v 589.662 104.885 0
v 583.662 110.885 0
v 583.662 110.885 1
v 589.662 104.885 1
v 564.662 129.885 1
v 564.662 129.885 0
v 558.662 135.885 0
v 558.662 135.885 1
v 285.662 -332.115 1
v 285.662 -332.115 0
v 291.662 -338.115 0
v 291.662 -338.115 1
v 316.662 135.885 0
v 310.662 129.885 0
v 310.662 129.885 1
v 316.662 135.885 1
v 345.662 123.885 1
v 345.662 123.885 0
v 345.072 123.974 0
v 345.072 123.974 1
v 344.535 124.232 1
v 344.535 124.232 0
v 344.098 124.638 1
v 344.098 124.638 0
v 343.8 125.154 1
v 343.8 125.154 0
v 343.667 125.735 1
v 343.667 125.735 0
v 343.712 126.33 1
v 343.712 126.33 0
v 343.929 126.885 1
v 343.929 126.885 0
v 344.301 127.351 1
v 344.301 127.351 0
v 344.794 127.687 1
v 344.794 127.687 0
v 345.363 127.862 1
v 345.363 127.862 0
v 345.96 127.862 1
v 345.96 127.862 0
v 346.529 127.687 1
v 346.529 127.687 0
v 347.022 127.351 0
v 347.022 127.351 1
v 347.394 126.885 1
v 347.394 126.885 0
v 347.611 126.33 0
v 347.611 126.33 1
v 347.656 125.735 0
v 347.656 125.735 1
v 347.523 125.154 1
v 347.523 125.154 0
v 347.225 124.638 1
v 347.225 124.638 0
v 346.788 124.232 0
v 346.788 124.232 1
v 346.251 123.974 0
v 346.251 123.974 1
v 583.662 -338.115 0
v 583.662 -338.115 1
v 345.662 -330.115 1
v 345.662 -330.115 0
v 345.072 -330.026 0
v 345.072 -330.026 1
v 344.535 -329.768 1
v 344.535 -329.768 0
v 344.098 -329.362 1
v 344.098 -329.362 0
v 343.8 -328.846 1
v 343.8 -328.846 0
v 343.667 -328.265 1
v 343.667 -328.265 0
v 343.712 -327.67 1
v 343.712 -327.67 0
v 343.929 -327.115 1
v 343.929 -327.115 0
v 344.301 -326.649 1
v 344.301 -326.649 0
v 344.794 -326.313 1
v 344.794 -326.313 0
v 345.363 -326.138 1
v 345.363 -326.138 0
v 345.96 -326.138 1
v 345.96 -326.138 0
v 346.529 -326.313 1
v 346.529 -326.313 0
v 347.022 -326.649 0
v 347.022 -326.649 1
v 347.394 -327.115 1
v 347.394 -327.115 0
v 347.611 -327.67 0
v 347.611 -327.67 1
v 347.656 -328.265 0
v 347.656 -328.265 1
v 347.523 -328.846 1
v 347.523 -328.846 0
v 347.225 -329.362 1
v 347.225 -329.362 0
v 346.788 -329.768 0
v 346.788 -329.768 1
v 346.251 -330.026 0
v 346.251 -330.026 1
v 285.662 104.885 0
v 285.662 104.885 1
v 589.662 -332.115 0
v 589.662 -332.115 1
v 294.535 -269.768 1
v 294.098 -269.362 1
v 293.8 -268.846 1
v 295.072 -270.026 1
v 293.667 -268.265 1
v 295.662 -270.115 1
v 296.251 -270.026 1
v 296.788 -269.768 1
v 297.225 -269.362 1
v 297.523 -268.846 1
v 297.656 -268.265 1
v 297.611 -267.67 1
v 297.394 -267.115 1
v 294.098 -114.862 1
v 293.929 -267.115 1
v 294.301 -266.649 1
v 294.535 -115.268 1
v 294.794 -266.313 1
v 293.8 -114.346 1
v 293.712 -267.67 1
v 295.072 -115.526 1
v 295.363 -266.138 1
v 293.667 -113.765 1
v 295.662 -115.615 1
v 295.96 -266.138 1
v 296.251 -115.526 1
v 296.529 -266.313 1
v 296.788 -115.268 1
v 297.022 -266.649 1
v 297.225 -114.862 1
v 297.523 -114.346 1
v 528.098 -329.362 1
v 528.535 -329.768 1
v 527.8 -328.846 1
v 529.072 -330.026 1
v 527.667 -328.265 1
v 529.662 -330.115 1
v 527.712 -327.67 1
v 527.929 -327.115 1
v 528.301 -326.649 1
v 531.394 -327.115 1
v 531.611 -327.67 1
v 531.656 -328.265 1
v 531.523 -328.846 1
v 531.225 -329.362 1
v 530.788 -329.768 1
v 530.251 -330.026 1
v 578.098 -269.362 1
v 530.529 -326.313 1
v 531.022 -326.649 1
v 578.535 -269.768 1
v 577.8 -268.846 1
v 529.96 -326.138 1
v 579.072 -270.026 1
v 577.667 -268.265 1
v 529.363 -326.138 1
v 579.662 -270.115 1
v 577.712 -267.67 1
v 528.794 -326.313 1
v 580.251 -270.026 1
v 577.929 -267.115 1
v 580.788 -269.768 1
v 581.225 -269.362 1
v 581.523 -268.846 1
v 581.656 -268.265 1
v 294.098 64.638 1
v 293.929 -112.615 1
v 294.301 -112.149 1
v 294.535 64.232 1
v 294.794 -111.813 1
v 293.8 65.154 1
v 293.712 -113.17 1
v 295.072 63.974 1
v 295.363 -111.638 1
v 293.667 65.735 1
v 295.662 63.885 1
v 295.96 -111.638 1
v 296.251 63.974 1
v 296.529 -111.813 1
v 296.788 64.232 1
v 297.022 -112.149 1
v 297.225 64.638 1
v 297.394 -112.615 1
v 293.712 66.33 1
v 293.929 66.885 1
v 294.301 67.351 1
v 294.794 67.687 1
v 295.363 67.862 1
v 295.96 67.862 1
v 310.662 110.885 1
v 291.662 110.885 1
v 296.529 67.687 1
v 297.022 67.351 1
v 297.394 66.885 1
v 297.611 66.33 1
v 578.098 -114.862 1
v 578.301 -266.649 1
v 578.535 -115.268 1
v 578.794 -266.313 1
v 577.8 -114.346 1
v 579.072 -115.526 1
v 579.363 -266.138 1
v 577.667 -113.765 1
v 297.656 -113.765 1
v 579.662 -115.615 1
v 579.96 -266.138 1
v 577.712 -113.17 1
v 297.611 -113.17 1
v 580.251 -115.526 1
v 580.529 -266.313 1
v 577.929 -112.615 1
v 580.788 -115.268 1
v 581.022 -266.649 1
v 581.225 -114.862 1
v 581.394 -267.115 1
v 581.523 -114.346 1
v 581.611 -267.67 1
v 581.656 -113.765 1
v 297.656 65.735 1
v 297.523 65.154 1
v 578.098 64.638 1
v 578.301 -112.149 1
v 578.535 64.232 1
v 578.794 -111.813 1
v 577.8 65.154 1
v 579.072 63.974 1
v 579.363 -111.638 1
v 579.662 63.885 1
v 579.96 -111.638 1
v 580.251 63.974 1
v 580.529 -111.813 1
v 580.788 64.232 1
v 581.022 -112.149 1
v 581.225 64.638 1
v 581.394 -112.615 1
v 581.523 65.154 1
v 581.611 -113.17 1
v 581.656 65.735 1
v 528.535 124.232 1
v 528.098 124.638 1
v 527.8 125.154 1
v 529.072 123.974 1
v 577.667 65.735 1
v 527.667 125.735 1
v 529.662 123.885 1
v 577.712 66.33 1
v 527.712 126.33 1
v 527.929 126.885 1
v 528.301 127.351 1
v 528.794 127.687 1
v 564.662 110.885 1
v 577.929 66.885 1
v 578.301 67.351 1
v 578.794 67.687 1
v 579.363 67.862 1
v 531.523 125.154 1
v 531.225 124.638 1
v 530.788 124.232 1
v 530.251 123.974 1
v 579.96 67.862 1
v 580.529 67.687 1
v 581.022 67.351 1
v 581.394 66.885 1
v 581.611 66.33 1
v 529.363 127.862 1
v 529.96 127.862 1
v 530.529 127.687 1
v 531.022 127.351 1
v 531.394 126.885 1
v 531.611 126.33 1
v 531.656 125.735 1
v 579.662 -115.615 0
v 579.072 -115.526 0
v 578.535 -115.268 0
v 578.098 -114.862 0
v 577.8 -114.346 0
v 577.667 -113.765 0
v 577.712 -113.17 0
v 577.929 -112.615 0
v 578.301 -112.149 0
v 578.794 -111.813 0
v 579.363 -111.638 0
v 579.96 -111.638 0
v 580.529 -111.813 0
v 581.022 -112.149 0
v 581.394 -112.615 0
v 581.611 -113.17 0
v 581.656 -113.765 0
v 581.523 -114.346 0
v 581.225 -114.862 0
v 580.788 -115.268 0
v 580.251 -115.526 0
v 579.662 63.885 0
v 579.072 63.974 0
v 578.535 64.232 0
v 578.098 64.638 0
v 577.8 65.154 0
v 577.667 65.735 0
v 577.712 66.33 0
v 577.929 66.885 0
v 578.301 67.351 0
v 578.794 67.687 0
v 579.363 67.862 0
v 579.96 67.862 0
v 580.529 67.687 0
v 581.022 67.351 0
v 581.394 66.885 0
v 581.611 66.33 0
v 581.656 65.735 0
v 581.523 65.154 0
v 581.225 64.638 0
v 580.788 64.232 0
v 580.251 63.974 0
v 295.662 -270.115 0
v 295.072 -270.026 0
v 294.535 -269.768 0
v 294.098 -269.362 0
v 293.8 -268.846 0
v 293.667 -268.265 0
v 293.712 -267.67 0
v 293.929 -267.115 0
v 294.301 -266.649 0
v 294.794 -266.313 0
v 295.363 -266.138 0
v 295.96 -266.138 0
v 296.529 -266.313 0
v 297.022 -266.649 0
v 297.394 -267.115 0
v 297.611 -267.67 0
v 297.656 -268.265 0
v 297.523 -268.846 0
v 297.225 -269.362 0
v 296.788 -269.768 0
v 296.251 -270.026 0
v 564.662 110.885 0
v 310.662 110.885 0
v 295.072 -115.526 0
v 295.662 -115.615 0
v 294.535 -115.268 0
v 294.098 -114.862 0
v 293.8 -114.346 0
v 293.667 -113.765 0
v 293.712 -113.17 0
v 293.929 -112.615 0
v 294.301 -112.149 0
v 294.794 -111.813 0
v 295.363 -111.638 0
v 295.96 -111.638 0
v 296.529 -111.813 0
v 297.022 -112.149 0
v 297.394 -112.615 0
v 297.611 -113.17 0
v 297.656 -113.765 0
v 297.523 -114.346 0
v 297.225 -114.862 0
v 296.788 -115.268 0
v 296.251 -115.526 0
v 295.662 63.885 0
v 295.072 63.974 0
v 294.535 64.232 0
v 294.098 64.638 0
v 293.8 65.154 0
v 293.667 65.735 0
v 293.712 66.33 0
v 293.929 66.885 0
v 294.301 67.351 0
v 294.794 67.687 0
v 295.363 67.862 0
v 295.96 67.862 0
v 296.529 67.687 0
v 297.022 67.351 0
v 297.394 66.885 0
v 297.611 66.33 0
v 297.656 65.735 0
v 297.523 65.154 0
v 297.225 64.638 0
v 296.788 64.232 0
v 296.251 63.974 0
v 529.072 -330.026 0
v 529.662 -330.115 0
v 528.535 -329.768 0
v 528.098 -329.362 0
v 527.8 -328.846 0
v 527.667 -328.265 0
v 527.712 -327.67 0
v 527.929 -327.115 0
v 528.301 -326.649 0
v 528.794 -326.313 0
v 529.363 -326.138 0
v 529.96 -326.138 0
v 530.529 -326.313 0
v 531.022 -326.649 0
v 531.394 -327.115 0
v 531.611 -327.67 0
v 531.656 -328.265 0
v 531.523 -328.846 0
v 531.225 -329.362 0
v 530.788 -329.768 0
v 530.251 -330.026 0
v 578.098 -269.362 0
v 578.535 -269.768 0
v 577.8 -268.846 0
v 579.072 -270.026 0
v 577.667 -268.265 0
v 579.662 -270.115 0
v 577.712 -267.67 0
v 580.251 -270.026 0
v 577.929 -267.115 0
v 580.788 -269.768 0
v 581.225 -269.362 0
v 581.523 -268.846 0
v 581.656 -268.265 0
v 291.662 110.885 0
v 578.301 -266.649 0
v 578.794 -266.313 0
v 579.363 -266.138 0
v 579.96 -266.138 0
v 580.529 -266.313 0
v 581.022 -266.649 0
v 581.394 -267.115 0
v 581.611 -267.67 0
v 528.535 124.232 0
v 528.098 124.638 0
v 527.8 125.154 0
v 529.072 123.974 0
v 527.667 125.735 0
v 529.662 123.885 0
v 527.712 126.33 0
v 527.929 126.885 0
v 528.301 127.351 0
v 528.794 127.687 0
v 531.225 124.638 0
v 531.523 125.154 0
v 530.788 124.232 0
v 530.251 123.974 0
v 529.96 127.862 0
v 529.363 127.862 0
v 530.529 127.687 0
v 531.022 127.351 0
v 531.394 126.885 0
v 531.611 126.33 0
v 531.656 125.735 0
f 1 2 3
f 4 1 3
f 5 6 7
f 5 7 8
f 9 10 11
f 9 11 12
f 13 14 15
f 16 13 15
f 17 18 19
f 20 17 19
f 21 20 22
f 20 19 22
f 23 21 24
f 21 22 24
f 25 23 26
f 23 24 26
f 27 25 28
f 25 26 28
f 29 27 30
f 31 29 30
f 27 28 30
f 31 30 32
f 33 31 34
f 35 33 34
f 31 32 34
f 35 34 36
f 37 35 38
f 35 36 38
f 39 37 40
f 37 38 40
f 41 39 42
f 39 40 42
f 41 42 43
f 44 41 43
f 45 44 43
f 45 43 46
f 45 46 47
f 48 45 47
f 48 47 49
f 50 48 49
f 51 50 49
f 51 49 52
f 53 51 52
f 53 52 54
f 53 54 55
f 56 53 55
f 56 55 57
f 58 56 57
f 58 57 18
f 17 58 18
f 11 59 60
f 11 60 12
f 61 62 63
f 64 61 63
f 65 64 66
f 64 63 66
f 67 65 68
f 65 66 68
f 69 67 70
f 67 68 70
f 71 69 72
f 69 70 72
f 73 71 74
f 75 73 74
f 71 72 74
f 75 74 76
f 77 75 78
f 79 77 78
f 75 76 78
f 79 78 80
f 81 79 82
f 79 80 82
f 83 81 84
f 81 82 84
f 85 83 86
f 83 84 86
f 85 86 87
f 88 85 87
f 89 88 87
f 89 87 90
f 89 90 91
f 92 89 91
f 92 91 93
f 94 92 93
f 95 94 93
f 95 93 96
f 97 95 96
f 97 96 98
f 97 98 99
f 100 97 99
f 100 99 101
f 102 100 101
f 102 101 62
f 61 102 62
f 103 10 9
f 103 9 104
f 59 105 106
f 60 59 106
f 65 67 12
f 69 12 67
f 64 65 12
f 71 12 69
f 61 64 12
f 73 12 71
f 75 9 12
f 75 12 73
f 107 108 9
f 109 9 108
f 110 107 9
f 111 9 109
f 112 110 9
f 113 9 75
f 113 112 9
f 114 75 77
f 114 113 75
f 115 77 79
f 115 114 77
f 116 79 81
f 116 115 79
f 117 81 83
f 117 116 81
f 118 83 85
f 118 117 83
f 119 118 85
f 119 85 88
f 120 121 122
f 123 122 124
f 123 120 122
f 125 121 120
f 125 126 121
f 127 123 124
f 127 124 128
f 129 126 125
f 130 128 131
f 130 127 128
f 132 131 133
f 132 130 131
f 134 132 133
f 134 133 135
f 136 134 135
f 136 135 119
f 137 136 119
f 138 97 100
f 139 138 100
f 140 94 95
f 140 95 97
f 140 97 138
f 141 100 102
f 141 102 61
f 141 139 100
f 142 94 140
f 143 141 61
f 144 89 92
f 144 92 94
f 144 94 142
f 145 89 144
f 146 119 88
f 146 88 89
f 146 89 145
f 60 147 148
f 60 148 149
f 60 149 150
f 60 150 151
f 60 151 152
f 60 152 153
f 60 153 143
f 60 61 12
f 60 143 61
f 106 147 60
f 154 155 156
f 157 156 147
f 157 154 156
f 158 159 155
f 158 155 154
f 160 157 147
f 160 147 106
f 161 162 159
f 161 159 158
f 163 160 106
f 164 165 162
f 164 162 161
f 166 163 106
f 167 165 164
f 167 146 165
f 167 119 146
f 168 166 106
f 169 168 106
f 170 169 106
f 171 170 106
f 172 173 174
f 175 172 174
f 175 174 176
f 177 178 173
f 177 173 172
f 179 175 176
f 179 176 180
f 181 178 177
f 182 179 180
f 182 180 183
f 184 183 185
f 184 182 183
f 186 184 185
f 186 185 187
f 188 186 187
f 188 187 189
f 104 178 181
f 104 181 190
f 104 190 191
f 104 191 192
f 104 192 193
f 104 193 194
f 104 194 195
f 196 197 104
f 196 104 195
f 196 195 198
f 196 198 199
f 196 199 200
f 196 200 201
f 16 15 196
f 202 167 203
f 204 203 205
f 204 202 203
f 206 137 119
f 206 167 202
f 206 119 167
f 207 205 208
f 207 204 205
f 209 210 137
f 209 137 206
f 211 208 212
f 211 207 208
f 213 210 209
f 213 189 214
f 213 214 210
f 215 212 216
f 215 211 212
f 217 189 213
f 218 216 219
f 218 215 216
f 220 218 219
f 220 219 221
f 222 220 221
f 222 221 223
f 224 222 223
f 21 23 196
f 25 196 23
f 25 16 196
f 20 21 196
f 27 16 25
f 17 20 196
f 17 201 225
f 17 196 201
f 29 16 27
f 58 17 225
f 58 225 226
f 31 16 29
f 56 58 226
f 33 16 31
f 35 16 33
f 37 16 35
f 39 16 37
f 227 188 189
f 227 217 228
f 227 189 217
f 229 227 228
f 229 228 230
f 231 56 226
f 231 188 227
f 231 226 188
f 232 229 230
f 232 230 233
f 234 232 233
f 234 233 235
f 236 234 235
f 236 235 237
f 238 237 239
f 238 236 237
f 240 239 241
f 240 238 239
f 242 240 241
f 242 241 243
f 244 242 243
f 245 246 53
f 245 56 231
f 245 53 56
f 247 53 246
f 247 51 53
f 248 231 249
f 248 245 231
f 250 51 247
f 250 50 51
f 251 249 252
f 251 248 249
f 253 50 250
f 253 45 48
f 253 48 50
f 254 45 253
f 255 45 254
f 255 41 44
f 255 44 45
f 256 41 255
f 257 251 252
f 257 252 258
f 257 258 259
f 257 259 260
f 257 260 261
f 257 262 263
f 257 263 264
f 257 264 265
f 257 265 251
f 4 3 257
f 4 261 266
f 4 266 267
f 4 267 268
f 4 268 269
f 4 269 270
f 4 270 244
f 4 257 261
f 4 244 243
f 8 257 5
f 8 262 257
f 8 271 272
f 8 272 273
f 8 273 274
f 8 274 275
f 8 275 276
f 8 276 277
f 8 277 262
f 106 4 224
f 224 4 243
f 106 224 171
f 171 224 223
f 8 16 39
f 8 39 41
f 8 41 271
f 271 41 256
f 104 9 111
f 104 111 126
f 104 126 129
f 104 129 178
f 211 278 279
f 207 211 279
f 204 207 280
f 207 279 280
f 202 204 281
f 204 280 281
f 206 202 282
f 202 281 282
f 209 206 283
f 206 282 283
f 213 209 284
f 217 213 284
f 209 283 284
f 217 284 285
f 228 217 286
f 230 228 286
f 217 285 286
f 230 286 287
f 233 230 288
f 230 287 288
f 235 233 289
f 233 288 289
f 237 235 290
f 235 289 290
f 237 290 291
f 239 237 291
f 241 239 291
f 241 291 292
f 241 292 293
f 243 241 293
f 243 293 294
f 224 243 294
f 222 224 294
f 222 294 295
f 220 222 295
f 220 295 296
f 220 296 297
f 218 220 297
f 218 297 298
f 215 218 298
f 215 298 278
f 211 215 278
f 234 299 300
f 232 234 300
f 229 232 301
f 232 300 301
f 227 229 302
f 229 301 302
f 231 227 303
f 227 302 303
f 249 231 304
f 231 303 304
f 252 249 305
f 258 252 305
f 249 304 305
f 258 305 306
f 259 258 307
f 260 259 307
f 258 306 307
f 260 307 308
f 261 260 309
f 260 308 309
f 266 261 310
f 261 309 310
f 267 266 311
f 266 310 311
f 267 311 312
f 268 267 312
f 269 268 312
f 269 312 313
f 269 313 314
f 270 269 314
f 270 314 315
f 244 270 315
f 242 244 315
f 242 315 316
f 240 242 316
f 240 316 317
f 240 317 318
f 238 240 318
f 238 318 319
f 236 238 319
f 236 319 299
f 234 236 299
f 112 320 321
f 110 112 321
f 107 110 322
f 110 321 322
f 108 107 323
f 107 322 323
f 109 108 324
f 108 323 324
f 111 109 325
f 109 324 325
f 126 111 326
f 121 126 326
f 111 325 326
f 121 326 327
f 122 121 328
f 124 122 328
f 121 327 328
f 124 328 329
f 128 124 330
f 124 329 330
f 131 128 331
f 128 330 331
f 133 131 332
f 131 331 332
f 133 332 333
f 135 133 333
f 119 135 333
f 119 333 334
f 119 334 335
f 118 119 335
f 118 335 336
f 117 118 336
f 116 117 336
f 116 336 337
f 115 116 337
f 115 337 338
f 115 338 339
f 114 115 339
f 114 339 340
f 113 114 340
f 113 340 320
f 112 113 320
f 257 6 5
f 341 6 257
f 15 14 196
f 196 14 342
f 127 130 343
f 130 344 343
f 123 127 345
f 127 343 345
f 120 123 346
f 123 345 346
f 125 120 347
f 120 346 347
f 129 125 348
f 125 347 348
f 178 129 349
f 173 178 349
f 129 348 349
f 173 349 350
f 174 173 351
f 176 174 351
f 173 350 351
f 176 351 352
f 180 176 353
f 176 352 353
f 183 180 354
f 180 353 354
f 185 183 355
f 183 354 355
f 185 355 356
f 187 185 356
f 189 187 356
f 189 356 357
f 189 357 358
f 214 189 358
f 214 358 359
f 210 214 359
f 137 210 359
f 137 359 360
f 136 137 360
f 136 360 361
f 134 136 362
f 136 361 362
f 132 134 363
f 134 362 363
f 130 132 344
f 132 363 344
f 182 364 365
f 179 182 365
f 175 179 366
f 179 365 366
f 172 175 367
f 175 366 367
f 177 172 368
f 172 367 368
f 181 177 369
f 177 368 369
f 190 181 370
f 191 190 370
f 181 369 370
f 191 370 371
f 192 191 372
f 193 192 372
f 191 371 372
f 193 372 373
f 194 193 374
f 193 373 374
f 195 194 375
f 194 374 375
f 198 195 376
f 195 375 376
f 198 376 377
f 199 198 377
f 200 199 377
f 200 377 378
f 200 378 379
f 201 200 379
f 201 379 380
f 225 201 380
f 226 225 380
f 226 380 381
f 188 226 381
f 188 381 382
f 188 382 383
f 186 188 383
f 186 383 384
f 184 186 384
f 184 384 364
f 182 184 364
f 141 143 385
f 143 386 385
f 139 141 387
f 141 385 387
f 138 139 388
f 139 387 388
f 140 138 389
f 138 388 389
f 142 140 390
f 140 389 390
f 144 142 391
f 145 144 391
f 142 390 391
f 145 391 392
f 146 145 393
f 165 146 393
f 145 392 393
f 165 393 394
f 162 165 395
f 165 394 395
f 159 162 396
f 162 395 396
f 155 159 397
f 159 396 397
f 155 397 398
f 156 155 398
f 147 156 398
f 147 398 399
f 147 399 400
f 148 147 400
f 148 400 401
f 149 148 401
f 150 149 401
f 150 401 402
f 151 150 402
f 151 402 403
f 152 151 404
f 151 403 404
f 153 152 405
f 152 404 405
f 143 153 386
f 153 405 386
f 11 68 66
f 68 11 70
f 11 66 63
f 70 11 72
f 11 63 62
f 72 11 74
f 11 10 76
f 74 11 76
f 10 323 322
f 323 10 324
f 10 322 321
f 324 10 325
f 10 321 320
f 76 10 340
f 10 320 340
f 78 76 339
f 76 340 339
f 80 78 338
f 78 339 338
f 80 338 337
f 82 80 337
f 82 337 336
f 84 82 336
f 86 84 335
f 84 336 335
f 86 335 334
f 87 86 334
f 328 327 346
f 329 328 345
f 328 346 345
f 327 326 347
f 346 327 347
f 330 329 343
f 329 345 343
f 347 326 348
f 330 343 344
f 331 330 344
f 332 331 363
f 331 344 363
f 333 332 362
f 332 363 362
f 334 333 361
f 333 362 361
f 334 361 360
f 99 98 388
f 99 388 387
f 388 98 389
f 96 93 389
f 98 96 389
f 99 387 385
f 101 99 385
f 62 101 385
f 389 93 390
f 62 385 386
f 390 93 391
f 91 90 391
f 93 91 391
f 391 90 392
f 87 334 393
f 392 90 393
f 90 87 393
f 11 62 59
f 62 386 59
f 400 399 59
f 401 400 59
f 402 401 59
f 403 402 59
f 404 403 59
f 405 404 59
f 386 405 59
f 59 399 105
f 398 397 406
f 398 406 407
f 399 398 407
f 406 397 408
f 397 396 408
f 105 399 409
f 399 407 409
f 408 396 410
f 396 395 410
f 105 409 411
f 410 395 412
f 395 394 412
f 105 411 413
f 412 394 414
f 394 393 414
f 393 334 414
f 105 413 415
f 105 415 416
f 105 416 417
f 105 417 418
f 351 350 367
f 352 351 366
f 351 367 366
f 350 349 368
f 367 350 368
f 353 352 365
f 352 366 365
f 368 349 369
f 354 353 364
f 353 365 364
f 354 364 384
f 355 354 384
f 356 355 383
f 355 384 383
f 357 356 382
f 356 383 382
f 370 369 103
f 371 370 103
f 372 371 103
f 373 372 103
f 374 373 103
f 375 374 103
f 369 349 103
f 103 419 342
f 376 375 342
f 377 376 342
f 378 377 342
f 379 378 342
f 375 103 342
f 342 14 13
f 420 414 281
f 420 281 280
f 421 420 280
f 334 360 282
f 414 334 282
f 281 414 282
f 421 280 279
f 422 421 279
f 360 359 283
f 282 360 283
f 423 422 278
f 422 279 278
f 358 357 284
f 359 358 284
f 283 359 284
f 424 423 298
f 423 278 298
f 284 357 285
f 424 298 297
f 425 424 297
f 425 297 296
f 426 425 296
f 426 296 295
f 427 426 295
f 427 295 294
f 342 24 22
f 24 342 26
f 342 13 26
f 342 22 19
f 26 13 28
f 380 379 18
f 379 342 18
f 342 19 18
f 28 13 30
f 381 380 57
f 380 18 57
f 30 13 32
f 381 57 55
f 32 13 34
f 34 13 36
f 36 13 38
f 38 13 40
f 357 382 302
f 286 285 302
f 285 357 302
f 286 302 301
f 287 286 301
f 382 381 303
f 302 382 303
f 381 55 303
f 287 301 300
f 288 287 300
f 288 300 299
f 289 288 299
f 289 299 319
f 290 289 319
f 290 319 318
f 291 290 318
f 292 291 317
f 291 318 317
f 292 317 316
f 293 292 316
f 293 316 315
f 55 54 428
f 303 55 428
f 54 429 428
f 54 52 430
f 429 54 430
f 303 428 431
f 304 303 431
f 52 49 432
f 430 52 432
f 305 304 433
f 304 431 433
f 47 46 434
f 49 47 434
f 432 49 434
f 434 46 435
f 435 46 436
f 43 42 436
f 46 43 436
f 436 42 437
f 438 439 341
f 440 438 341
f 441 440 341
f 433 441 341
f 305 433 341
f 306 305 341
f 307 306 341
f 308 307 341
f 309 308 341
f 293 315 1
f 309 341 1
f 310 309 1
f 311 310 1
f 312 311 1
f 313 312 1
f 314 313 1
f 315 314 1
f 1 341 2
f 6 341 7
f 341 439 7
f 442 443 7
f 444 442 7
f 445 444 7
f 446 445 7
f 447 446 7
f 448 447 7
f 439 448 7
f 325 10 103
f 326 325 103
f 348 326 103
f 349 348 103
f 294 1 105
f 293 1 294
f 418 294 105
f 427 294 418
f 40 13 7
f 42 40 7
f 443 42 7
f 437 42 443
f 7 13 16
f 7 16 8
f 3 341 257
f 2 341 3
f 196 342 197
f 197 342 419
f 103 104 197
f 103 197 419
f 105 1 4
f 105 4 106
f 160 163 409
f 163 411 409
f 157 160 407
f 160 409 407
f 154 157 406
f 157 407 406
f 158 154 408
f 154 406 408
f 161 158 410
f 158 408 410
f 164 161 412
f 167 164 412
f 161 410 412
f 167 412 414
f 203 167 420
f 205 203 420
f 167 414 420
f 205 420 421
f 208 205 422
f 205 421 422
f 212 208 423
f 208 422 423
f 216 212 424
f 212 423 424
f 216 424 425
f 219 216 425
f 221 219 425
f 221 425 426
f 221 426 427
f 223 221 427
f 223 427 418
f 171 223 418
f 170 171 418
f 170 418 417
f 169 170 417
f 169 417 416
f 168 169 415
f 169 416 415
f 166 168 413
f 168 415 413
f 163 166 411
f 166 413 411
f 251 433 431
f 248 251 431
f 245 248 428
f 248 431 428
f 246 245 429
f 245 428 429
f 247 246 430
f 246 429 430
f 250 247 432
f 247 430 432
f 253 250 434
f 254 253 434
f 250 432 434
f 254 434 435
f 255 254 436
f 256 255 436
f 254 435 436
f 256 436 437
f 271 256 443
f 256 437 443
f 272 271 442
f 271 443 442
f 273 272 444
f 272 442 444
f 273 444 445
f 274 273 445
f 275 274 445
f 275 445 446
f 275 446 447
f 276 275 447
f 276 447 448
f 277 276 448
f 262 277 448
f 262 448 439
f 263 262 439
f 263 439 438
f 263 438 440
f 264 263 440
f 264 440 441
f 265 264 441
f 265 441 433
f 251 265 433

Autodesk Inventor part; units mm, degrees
ref_plane "YZ Plane" through (0, 0, 0) normal (1, 0, 0) x (0, 1, 0)
ref_plane "XZ Plane" through (0, 0, 0) normal (0, 1, 0) x (-1, 0, 0)
sketch "Sketch1" plane through (0, 0, 0) normal (0, 0, 1) x (1, 0, 0)
  line L0 (285.6615, 135.8847) -> (589.6615, 135.8847)
  line L1 (589.6615, 135.8847) -> (589.6615, -338.1153)
  line L2 (589.6615, -338.1153) -> (285.6615, -338.1153)
  line L3 (285.6615, -338.1153) -> (285.6615, 135.8847)
  line L4 (285.6615, 135.8847) -> (310.6615, 135.8847)
  line L5 (310.6615, 135.8847) -> (310.6615, 110.8847)
  line L6 (310.6615, 110.8847) -> (285.6615, 110.8847)
  line L7 (285.6615, 110.8847) -> (285.6615, 135.8847)
  line L8 (589.6615, 135.8847) -> (564.6615, 135.8847)
  line L9 (564.6615, 135.8847) -> (564.6615, 110.8847)
  line L10 (564.6615, 110.8847) -> (589.6615, 110.8847)
  line L11 (589.6615, 110.8847) -> (589.6615, 135.8847)
  line L12 (592.6615, 138.6726) -> (592.6615, -341.1153)
  line L13 (596.6615, -341.1153) -> (278.6615, -341.1153)
  line L14 (282.6615, -341.1153) -> (282.6615, 138.6726)
  line L15 (282.8736, 138.8847) -> (592.4493, 138.8847)
  dimension "d44" = 25
  dimension "d45" = 25
  dimension "d46" = 25
  dimension "d47" = 25
  dimension "d80" = 3
  dimension "d81" = 3
  dimension "d82" = 3
  dimension "d83" = 3
ref_plane "Work Plane1" through (0, 0, 1) normal (0, 0, 1) x (1, 0, 0)
sketch "Sketch2" plane through (0, 0, 1) normal (0, 0, 1) x (1, 0, 0)
  line L0 (-371, 477) -> (-30.2121, 477) projected
  line L1 (-377, 455) -> (-377, 471) projected
  line L2 (-24.2121, 471) -> (-24.2121, 455) projected
  line L3 (-30.2121, 3) -> (-371, 3) projected
  line L4 (-402, 34) -> (-402, 446) projected
  line L5 (-396, 452) -> (-380, 452) projected
  line L6 (-380, 28) -> (-396, 28) projected
  line L7 (0.7879, 446) -> (0.7879, 34) projected
  point P0 (0, 0)
  point P1 (-317, 467)
  point P2 (-84.2121, 467)
  point P3 (-392, 392)
  point P4 (-392, 88)
  point P5 (-392, 240)
  point P6 (-9.2121, 392)
  point P7 (-9.2121, 240)
  point P8 (-9.2121, 88)
  point P9 (-317, 13)
  point P10 (-84.2121, 13)
  point P11 (-402, 240)
  dimension "d27" = 10
  dimension "d28" = 60
  dimension "d29" = 60
  dimension "d30" = 10
  dimension "d31" = 10
  dimension "d32" = 60
  dimension "d33" = 60
  dimension "d34" = 10
extrude "Plate2" add sketch "Sketch1" along normal blind 1 contours L0 L9 L10 L1 L2 L3 L6 L5
hole "Hole2" at (-317, 467, 1) at (-84.2121, 467, 1) at (-392, 392, 1) at (-392, 88, 1) at (-392, 240, 1) at (-9.2121, 392, 1) at (-9.2121, 240, 1) at (-9.2121, 88, 1) at (-317, 13, 1) at (-84.2121, 13, 1) direction (0, 0, -1) diameter 4 depth 1 tip angle 118
chamfer "Corner Chamfer1" distance 6 angle 45 6 edges at (285.6615, 110.8847, 0.5) (310.6615, 135.8847, 0.5) (564.6615, 135.8847, 0.5) (589.6615, 110.8847, 0.5) (589.6615, -338.1153, 0.5) (285.6615, -338.1153, 0.5)
sketch "Sketch3" plane through (0, 0, 1) normal (0, 0, 1) x (1, 0, 0)
  line L0 (291.6615, -338.1153) -> (583.6615, -338.1153) projected
  line L1 (589.6615, 104.8847) -> (589.6615, -332.1153) projected
  line L2 (285.6615, -332.1153) -> (285.6615, 104.8847) projected
  line L3 (316.6615, 135.8847) -> (558.6615, 135.8847) projected
  point P0 (0, 0)
  point P1 (529.6615, -328.1153)
  point P2 (345.6615, -328.1153)
  point P3 (579.6615, -268.1153)
  point P4 (579.6615, -113.6153)
  point P5 (579.6615, 65.8847)
  point P6 (529.6615, 125.8847)
  point P7 (345.6615, 125.8847)
  point P8 (295.6615, 65.8847)
  point P9 (295.6615, -113.6153)
  point P10 (295.6615, -268.1153)
  point P11 (589.6615, -113.6153)
  dimension "d63" = 10
  dimension "d64" = 60
  dimension "d65" = 60
  dimension "d66" = 10
  dimension "d67" = 70
  dimension "d68" = 70
  dimension "d69" = 10
  dimension "d70" = 10
hole "Hole3" at (529.6615, -328.1153, 1) at (345.6615, -328.1153, 1) at (579.6615, -268.1153, 1) at (579.6615, -113.6153, 1) at (579.6615, 65.8847, 1) at (529.6615, 125.8847, 1) at (345.6615, 125.8847, 1) at (295.6615, 65.8847, 1) at (295.6615, -113.6153, 1) at (295.6615, -268.1153, 1) direction (0, 0, -1) diameter 4 depth 1 tip angle 118
equation "\"d30\" = d27"
equation "\"d54\" = Thickness"
equation "\"d76\" = Thickness"
equation "\"BendRadius\" = Thickness"
equation "\"BendReliefWidth\" = Thickness"
equation "\"BendReliefDepth\" = 0.5 * Thickness"
equation "\"CornerReliefSize\" = 4 * Thickness"
equation "\"MinimumRemnant\" = 2 * Thickness"
equation "\"TransitionRadius\" = BendRadius"
equation "\"JacobiRadiusSize\" = BendRadius"
equation "\"GapSize\" = Thickness"
equation "\"d26\" = BendRadius"
equation "\"d48\" = BendRadius"
equation "\"Thickness\" = 1"
properties part number "Sheetbottom"
